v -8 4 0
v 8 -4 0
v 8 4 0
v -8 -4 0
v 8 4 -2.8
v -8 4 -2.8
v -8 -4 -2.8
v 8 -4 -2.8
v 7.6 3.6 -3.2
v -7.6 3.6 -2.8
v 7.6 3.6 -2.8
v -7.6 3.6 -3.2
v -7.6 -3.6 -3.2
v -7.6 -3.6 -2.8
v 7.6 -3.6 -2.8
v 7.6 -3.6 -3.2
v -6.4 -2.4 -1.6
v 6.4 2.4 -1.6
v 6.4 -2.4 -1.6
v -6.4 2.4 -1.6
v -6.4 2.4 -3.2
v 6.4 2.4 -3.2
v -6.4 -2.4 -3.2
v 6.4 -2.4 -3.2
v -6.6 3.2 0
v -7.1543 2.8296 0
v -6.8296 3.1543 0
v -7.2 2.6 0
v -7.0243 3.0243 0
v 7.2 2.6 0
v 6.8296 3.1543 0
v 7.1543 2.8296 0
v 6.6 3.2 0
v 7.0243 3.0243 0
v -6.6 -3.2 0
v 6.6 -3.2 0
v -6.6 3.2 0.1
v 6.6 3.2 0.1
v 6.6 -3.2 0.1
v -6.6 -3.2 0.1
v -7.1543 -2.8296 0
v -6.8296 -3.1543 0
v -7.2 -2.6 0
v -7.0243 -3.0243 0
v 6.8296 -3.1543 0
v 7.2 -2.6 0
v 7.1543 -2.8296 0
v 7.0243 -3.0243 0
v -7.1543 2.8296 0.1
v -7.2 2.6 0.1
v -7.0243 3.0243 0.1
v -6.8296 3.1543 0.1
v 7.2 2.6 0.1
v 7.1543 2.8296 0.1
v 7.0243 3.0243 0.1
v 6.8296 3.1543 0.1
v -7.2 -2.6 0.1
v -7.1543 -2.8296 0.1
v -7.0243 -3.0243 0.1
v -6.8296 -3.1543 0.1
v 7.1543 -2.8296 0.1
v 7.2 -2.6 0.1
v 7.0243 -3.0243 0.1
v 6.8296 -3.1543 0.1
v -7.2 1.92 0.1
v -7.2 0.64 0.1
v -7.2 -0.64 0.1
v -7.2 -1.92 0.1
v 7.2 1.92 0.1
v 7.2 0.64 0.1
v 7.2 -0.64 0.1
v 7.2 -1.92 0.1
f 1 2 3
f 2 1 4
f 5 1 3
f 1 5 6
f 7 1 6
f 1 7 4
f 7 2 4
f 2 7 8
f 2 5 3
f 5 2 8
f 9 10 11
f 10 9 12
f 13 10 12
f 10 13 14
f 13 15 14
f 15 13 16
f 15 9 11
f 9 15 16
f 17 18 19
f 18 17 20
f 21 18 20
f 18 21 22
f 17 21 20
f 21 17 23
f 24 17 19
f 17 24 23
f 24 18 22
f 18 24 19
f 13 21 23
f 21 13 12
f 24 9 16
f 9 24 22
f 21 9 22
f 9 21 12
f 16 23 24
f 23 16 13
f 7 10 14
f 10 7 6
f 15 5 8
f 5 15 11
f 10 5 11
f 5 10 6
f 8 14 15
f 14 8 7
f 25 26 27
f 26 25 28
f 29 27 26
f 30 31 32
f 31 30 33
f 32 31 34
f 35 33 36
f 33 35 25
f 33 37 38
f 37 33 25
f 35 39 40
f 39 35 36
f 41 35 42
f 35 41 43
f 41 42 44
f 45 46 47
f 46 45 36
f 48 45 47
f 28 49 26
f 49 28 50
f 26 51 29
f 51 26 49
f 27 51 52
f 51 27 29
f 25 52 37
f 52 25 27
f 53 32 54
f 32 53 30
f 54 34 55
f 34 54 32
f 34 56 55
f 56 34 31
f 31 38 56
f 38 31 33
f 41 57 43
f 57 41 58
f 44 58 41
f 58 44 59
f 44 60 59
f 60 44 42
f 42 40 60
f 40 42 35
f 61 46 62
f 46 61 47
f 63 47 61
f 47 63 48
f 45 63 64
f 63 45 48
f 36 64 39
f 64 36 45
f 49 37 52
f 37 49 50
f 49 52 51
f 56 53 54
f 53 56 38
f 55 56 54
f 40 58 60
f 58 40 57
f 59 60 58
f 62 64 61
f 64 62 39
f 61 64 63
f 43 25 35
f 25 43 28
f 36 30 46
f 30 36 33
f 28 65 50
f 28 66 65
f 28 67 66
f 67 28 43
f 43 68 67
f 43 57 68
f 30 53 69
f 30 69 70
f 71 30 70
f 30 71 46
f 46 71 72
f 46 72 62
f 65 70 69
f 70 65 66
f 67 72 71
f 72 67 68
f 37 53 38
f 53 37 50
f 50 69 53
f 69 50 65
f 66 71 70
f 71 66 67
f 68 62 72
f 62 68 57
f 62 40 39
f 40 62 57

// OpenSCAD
// file: ../p/box5.scad
use <../lib.scad>
function ldraw_lib__box5() = [
// 0 Box with 5 Faces and All Edges
// 0 Name: box5.dat
// 0 Author: James Jessiman
// 0 !LDRAW_ORG Primitive UPDATE 2012-01
// 0 !LICENSE Licensed under CC BY 4.0 : see CAreadme.txt
// 
// 0 BFC CERTIFY CCW
  [0,"BFC","CERTIFY"],
  [0,"BFC","CCW"],
// 
// 0 !HISTORY 2002-04-03 [sbliss] Modified for BFC compliance
// 0 !HISTORY 2002-04-25 [PTadmin] Official Update 2002-02
// 0 !HISTORY 2007-06-24 [PTadmin] Header formatted for Contributor Agreement
// 0 !HISTORY 2008-07-01 [PTadmin] Official Update 2008-01
// 0 !HISTORY 2012-02-16 [Philo] Changed to CCW
// 0 !HISTORY 2012-03-30 [PTadmin] Official Update 2012-01
// 
// 
// 2 24 1 1 1 -1 1 1
  [2,24,1,1,1,-1,1,1],
// 2 24 -1 1 1 -1 1 -1
  [2,24,-1,1,1,-1,1,-1],
// 2 24 -1 1 -1 1 1 -1
  [2,24,-1,1,-1,1,1,-1],
// 2 24 1 1 -1 1 1 1
  [2,24,1,1,-1,1,1,1],
// 2 24 1 0 1 -1 0 1
  [2,24,1,0,1,-1,0,1],
// 2 24 -1 0 1 -1 0 -1
  [2,24,-1,0,1,-1,0,-1],
// 2 24 -1 0 -1 1 0 -1
  [2,24,-1,0,-1,1,0,-1],
// 2 24 1 0 -1 1 0 1
  [2,24,1,0,-1,1,0,1],
// 2 24 1 0 1 1 1 1
  [2,24,1,0,1,1,1,1],
// 2 24 -1 0 1 -1 1 1
  [2,24,-1,0,1,-1,1,1],
// 2 24 1 0 -1 1 1 -1
  [2,24,1,0,-1,1,1,-1],
// 2 24 -1 0 -1 -1 1 -1
  [2,24,-1,0,-1,-1,1,-1],
// 4 16 -1 1 1 1 1 1 1 1 -1 -1 1 -1
  [4,16,-1,1,1,1,1,1,1,1,-1,-1,1,-1],
// 4 16 -1 1 1 -1 0 1 1 0 1 1 1 1
  [4,16,-1,1,1,-1,0,1,1,0,1,1,1,1],
// 4 16 -1 1 -1 -1 0 -1 -1 0 1 -1 1 1
  [4,16,-1,1,-1,-1,0,-1,-1,0,1,-1,1,1],
// 4 16 1 1 -1 1 0 -1 -1 0 -1 -1 1 -1
  [4,16,1,1,-1,1,0,-1,-1,0,-1,-1,1,-1],
// 4 16 1 1 1 1 0 1 1 0 -1 1 1 -1
  [4,16,1,1,1,1,0,1,1,0,-1,1,1,-1],
];
module ldraw_lib__box5(step=0, col=false, unit=2/5, alt=false, line=0.2, solid=!$preview)
    makepoly(ldraw_lib__box5(), step=step, col=col, unit=unit, alt=alt, line=line, solid=solid);
ldraw_lib__box5(line=0.2);
// file: ../p/box4.scad
use <../lib.scad>
function ldraw_lib__box4() = [
// 0 Box with 4 Faces (2 Parallel Pairs) and All Edges
// 0 Name: box4.dat
// 0 Author: James Jessiman
// 0 !LDRAW_ORG Primitive UPDATE 2012-01
// 0 !LICENSE Licensed under CC BY 4.0 : see CAreadme.txt
// 
// 0 BFC CERTIFY CCW
  [0,"BFC","CERTIFY"],
  [0,"BFC","CCW"],
// 
// 0 !HISTORY 2002-04-03 [sbliss] Modified for BFC compliance
// 0 !HISTORY 2002-04-25 [PTadmin] Official Update 2002-02
// 0 !HISTORY 2007-06-24 [PTadmin] Header formatted for Contributor Agreement
// 0 !HISTORY 2008-07-01 [PTadmin] Official Update 2008-01
// 0 !HISTORY 2012-02-16 [Philo] Changed to CCW
// 0 !HISTORY 2012-03-30 [PTadmin] Official Update 2012-01
// 
// 
// 2 24 1 1 1 -1 1 1
  [2,24,1,1,1,-1,1,1],
// 2 24 -1 1 1 -1 1 -1
  [2,24,-1,1,1,-1,1,-1],
// 2 24 -1 1 -1 1 1 -1
  [2,24,-1,1,-1,1,1,-1],
// 2 24 1 1 -1 1 1 1
  [2,24,1,1,-1,1,1,1],
// 2 24 1 0 1 -1 0 1
  [2,24,1,0,1,-1,0,1],
// 2 24 -1 0 1 -1 0 -1
  [2,24,-1,0,1,-1,0,-1],
// 2 24 -1 0 -1 1 0 -1
  [2,24,-1,0,-1,1,0,-1],
// 2 24 1 0 -1 1 0 1
  [2,24,1,0,-1,1,0,1],
// 2 24 1 0 1 1 1 1
  [2,24,1,0,1,1,1,1],
// 2 24 -1 0 1 -1 1 1
  [2,24,-1,0,1,-1,1,1],
// 2 24 1 0 -1 1 1 -1
  [2,24,1,0,-1,1,1,-1],
// 2 24 -1 0 -1 -1 1 -1
  [2,24,-1,0,-1,-1,1,-1],
// 4 16 -1 1 1 -1 0 1 1 0 1 1 1 1
  [4,16,-1,1,1,-1,0,1,1,0,1,1,1,1],
// 4 16 -1 1 -1 -1 0 -1 -1 0 1 -1 1 1
  [4,16,-1,1,-1,-1,0,-1,-1,0,1,-1,1,1],
// 4 16 1 1 -1 1 0 -1 -1 0 -1 -1 1 -1
  [4,16,1,1,-1,1,0,-1,-1,0,-1,-1,1,-1],
// 4 16 1 1 1 1 0 1 1 0 -1 1 1 -1
  [4,16,1,1,1,1,0,1,1,0,-1,1,1,-1],
];
module ldraw_lib__box4(step=0, col=false, unit=2/5, alt=false, line=0.2, solid=!$preview)
    makepoly(ldraw_lib__box4(), step=step, col=col, unit=unit, alt=alt, line=line, solid=solid);
ldraw_lib__box4(line=0.2);
// file: ../p/box3u12.scad
use <../lib.scad>
function ldraw_lib__box3u12() = [
// 0 Box with 3 Parallel Faces without Any Edges
// 0 Name: box3u12.dat
// 0 Author: J.C. Tchang [tchang]
// 0 !LDRAW_ORG Primitive UPDATE 2014-02
// 0 !LICENSE Licensed under CC BY 4.0 : see CAreadme.txt
// 
// 0 BFC CERTIFY CCW
  [0,"BFC","CERTIFY"],
  [0,"BFC","CCW"],
// 
// 0 !HISTORY 2014-12-23 [PTadmin] Official Update 2014-02
// 
// 
// 4 16 -1 1 1 1 1 1 1 1 -1 -1 1 -1
  [4,16,-1,1,1,1,1,1,1,1,-1,-1,1,-1],
// 4 16 -1 1 1 -1 0 1 1 0 1 1 1 1
  [4,16,-1,1,1,-1,0,1,1,0,1,1,1,1],
// 4 16 1 1 -1 1 0 -1 -1 0 -1 -1 1 -1
  [4,16,1,1,-1,1,0,-1,-1,0,-1,-1,1,-1],
];
module ldraw_lib__box3u12(step=0, col=false, unit=2/5, alt=false, line=0.2, solid=!$preview)
    makepoly(ldraw_lib__box3u12(), step=step, col=col, unit=unit, alt=alt, line=line, solid=solid);
ldraw_lib__box3u12(line=0.2);
// file: ../p/1-4cyli.scad
use <../lib.scad>
function ldraw_lib__1_4cyli() = [
// 0 Cylinder 0.25
// 0 Name: 1-4cyli.dat
// 0 Author: James Jessiman
// 0 !LDRAW_ORG Primitive UPDATE 2012-01
// 0 !LICENSE Licensed under CC BY 4.0 : see CAreadme.txt
// 
// 0 BFC CERTIFY CCW
  [0,"BFC","CERTIFY"],
  [0,"BFC","CCW"],
// 
// 0 !HISTORY 2002-03-23 [sbliss] Added BFC statement.
// 0 !HISTORY 2002-04-25 [PTadmin] Official Update 2002-02
// 0 !HISTORY 2007-06-22 [PTadmin] Header formatted for Contributor Agreement
// 0 !HISTORY 2008-07-01 [PTadmin] Official Update 2008-01
// 0 !HISTORY 2012-02-16 [Philo] Changed to CCW
// 0 !HISTORY 2012-03-30 [PTadmin] Official Update 2012-01
// 
// 
// 4 16 1 1 0 0.9239 1 0.3827 0.9239 0 0.3827 1 0 0
  [4,16,1,1,0,0.9239,1,0.3827,0.9239,0,0.3827,1,0,0],
// 5 24 1 0 0 1 1 0 0.9239 0 0.3827 1 0 -1
  [5,24,1,0,0,1,1,0,0.9239,0,0.3827,1,0,-1],
// 4 16 0.9239 1 0.3827 0.7071 1 0.7071 0.7071 0 0.7071 0.9239 0 0.3827
  [4,16,0.9239,1,0.3827,0.7071,1,0.7071,0.7071,0,0.7071,0.9239,0,0.3827],
// 5 24 0.9239 0 0.3827 0.9239 1 0.3827 0.7071 0 0.7071 1 0 0
  [5,24,0.9239,0,0.3827,0.9239,1,0.3827,0.7071,0,0.7071,1,0,0],
// 4 16 0.7071 1 0.7071 0.3827 1 0.9239 0.3827 0 0.9239 0.7071 0 0.7071
  [4,16,0.7071,1,0.7071,0.3827,1,0.9239,0.3827,0,0.9239,0.7071,0,0.7071],
// 5 24 0.7071 0 0.7071 0.7071 1 0.7071 0.3827 0 0.9239 0.9239 0 0.3827
  [5,24,0.7071,0,0.7071,0.7071,1,0.7071,0.3827,0,0.9239,0.9239,0,0.3827],
// 4 16 0.3827 1 0.9239 0 1 1 0 0 1 0.3827 0 0.9239
  [4,16,0.3827,1,0.9239,0,1,1,0,0,1,0.3827,0,0.9239],
// 5 24 0.3827 0 0.9239 0.3827 1 0.9239 0 0 1 0.7071 0 0.7071
  [5,24,0.3827,0,0.9239,0.3827,1,0.9239,0,0,1,0.7071,0,0.7071],
// 5 24 0 0 1 0 1 1 0.3827 0 0.9239 -1 0 1
  [5,24,0,0,1,0,1,1,0.3827,0,0.9239,-1,0,1],
];
module ldraw_lib__1_4cyli(step=0, col=false, unit=2/5, alt=false, line=0.2, solid=!$preview)
    makepoly(ldraw_lib__1_4cyli(), step=step, col=col, unit=unit, alt=alt, line=line, solid=solid);
ldraw_lib__1_4cyli(line=0.2);
// file: ../p/1-4chrd.scad
use <../lib.scad>
function ldraw_lib__1_4chrd() = [
// 0 Chord 0.25
// 0 Name: 1-4chrd.dat
// 0 Author: Max Martin Richter [MMR1988]
// 0 !LDRAW_ORG Primitive UPDATE 2023-05
// 0 !LICENSE Licensed under CC BY 4.0 : see CAreadme.txt
// 
// 0 BFC CERTIFY CCW
  [0,"BFC","CERTIFY"],
  [0,"BFC","CCW"],
// 
// 0 !HISTORY 2004-04-22 [PTadmin] Official Update 2004-02
// 0 !HISTORY 2007-10-09 [PTadmin] Header formatted for Contributor Agreement
// 0 !HISTORY 2008-07-01 [PTadmin] Official Update 2008-01
// 0 !HISTORY 2012-08-02 [MMR1988] Re-creation with PrimGen2 and Rectifier
// 0 !HISTORY 2012-08-09 [PTadmin] Official Update 2012-02
// 0 !HISTORY 2023-10-27 [OrionP] Change author to MMR1988 from hafhead
// 0 !HISTORY 2023-10-31 [OrionP] Official Update 2023-05
// 
// 4 16 0.9239 0 0.3827 0.3827 0 0.9239 0 0 1 1 0 0
  [4,16,0.9239,0,0.3827,0.3827,0,0.9239,0,0,1,1,0,0],
// 3 16 0.7071 0 0.7071 0.3827 0 0.9239 0.9239 0 0.3827
  [3,16,0.7071,0,0.7071,0.3827,0,0.9239,0.9239,0,0.3827],
];
module ldraw_lib__1_4chrd(step=0, col=false, unit=2/5, alt=false, line=0.2, solid=!$preview)
    makepoly(ldraw_lib__1_4chrd(), step=step, col=col, unit=unit, alt=alt, line=line, solid=solid);
ldraw_lib__1_4chrd(line=0.2);
// file: s/3069bs01.scad
use <../../lib.scad>
use <../../p/box4.scad>
use <../../p/box5.scad>
function ldraw_lib__s__3069bs01() = [
// 0 ~Tile  1 x  2 with Groove without Top Face
// 0 Name: s\3069bs01.dat
// 0 Author: Santeri Piippo [arezey]
// 0 !LDRAW_ORG Subpart UPDATE 2010-02
// 0 !LICENSE Licensed under CC BY 4.0 : see CAreadme.txt
// 
// 0 BFC CERTIFY CCW
  [0,"BFC","CERTIFY"],
  [0,"BFC","CCW"],
// 
// 0 !HISTORY 2010-07-05 [PTadmin] Official Update 2010-02
// 
// 
// 1 16 0 0 0 20 0 0 0 7 0 0 0 10 box4.dat
  [1,16,0,0,0,20,0,0,0,7,0,0,0,10, ldraw_lib__box4()],
// 1 16 0 7 0 19 0 0 0 1 0 0 0 9 box4.dat
  [1,16,0,7,0,19,0,0,0,1,0,0,0,9, ldraw_lib__box4()],
// 0 BFC INVERTNEXT
  [0,"BFC","INVERTNEXT"],
// 1 16 0 8 0 16 0 0 0 -4 0 0 0 6 box5.dat
  [1,16,0,8,0,16,0,0,0,-4,0,0,0,6, ldraw_lib__box5()],
// 4 16 -19 8 9 -16 8 6 -16 8 -6 -19 8 -9
  [4,16,-19,8,9,-16,8,6,-16,8,-6,-19,8,-9],
// 4 16 19 8 -9 16 8 -6 16 8 6 19 8 9
  [4,16,19,8,-9,16,8,-6,16,8,6,19,8,9],
// 4 16 19 8 9 16 8 6 -16 8 6 -19 8 9
  [4,16,19,8,9,16,8,6,-16,8,6,-19,8,9],
// 4 16 -19 8 -9 -16 8 -6 16 8 -6 19 8 -9
  [4,16,-19,8,-9,-16,8,-6,16,8,-6,19,8,-9],
// 4 16 -20 7 10 -19 7 9 -19 7 -9 -20 7 -10
  [4,16,-20,7,10,-19,7,9,-19,7,-9,-20,7,-10],
// 4 16 20 7 -10 19 7 -9 19 7 9 20 7 10
  [4,16,20,7,-10,19,7,-9,19,7,9,20,7,10],
// 4 16 20 7 10 19 7 9 -19 7 9 -20 7 10
  [4,16,20,7,10,19,7,9,-19,7,9,-20,7,10],
// 4 16 -20 7 -10 -19 7 -9 19 7 -9 20 7 -10
  [4,16,-20,7,-10,-19,7,-9,19,7,-9,20,7,-10],
// 0 //
];
module ldraw_lib__s__3069bs01(step=0, col=false, unit=2/5, alt=false, line=0.2, solid=!$preview)
    makepoly(ldraw_lib__s__3069bs01(), step=step, col=col, unit=unit, alt=alt, line=line, solid=solid);
ldraw_lib__s__3069bs01(line=0.2);
// file: 6148328af.scad
use <../lib.scad>
use <../p/1-4chrd.scad>
use <../p/1-4cyli.scad>
use <../p/box3u12.scad>
function ldraw_lib__6148328af() = [
// 0 Sticker  0.8 x  1.8 with White Stripes on Red Background
// 0 Name: 6148328af.dat
// 0 Author: Massimo Maso [Sirio]
// 0 !LDRAW_ORG Part UPDATE 2024-08
// 0 !LICENSE Licensed under CC BY 4.0 : see CAreadme.txt
// 
// 0 BFC CERTIFY CCW
  [0,"BFC","CERTIFY"],
  [0,"BFC","CCW"],
// 
// 0 !KEYWORDS 917K, Bricklink 75876stk01, Brickowl 852010, Pit Lane, Porsche
// 0 !KEYWORDS Rebrickable 26357, set 75876, Speed Champions
// 
// 0 !HISTORY 2024-09-30 [OrionP] Official Update 2024-08
// 
// 
// 0 // Primitives
// 
// 1 16 -16.5 0 6.5 -1.5 0 0 0 -1 0 0 0 1.5 1-4chrd.dat
  [1,16,-16.5,0,6.5,-1.5,0,0,0,-1,0,0,0,1.5, ldraw_lib__1_4chrd()],
// 1 16 16.5 0 6.5 1.5 0 0 0 -1 0 0 0 1.5 1-4chrd.dat
  [1,16,16.5,0,6.5,1.5,0,0,0,-1,0,0,0,1.5, ldraw_lib__1_4chrd()],
// 1 16 0 -.25 0 16.5 0 0 0 .25 0 0 0 8 box3u12.dat
  [1,16,0,-.25,0,16.5,0,0,0,.25,0,0,0,8, ldraw_lib__box3u12()],
// 1 16 -16.5 0 -6.5 -1.5 0 0 0 -1 0 0 0 -1.5 1-4chrd.dat
  [1,16,-16.5,0,-6.5,-1.5,0,0,0,-1,0,0,0,-1.5, ldraw_lib__1_4chrd()],
// 1 16 16.5 0 -6.5 1.5 0 0 0 -1 0 0 0 -1.5 1-4chrd.dat
  [1,16,16.5,0,-6.5,1.5,0,0,0,-1,0,0,0,-1.5, ldraw_lib__1_4chrd()],
// 1 16 -16.5 0 6.5 -1.5 0 0 0 -.25 0 0 0 1.5 1-4cyli.dat
  [1,16,-16.5,0,6.5,-1.5,0,0,0,-.25,0,0,0,1.5, ldraw_lib__1_4cyli()],
// 1 16 16.5 0 6.5 1.5 0 0 0 -.25 0 0 0 1.5 1-4cyli.dat
  [1,16,16.5,0,6.5,1.5,0,0,0,-.25,0,0,0,1.5, ldraw_lib__1_4cyli()],
// 1 16 -16.5 0 -6.5 -1.5 0 0 0 -.25 0 0 0 -1.5 1-4cyli.dat
  [1,16,-16.5,0,-6.5,-1.5,0,0,0,-.25,0,0,0,-1.5, ldraw_lib__1_4cyli()],
// 1 16 16.5 0 -6.5 1.5 0 0 0 -.25 0 0 0 -1.5 1-4cyli.dat
  [1,16,16.5,0,-6.5,1.5,0,0,0,-.25,0,0,0,-1.5, ldraw_lib__1_4cyli()],
// 1 15 -16.5 -.25 6.5 -1.5 0 0 0 1 0 0 0 1.5 1-4chrd.dat
  [1,15,-16.5,-.25,6.5,-1.5,0,0,0,1,0,0,0,1.5, ldraw_lib__1_4chrd()],
// 1 15 16.5 -.25 6.5 1.5 0 0 0 1 0 0 0 1.5 1-4chrd.dat
  [1,15,16.5,-.25,6.5,1.5,0,0,0,1,0,0,0,1.5, ldraw_lib__1_4chrd()],
// 1 15 -16.5 -.25 -6.5 -1.5 0 0 0 1 0 0 0 -1.5 1-4chrd.dat
  [1,15,-16.5,-.25,-6.5,-1.5,0,0,0,1,0,0,0,-1.5, ldraw_lib__1_4chrd()],
// 1 15 16.5 -.25 -6.5 1.5 0 0 0 1 0 0 0 -1.5 1-4chrd.dat
  [1,15,16.5,-.25,-6.5,1.5,0,0,0,1,0,0,0,-1.5, ldraw_lib__1_4chrd()],
// 0 // Bottom faces
// 4 16 -16.5 0 8 -16.5 0 -8 -18 0 -6.5 -18 0 6.5
  [4,16,-16.5,0,8,-16.5,0,-8,-18,0,-6.5,-18,0,6.5],
// 4 16 16.5 0 8 18 0 6.5 18 0 -6.5 16.5 0 -8
  [4,16,16.5,0,8,18,0,6.5,18,0,-6.5,16.5,0,-8],
// 0 // Lateral faces
// 3 16 -18 0 6.5 -18 -.25 4.8 -18 -.25 6.5
  [3,16,-18,0,6.5,-18,-.25,4.8,-18,-.25,6.5],
// 3 16 -18 0 6.5 -18 -.25 1.6 -18 -.25 4.8
  [3,16,-18,0,6.5,-18,-.25,1.6,-18,-.25,4.8],
// 4 16 -18 0 6.5 -18 0 -6.5 -18 -.25 -1.6 -18 -.25 1.6
  [4,16,-18,0,6.5,-18,0,-6.5,-18,-.25,-1.6,-18,-.25,1.6],
// 3 16 -18 0 -6.5 -18 -.25 -4.8 -18 -.25 -1.6
  [3,16,-18,0,-6.5,-18,-.25,-4.8,-18,-.25,-1.6],
// 3 16 -18 0 -6.5 -18 -.25 -6.5 -18 -.25 -4.8
  [3,16,-18,0,-6.5,-18,-.25,-6.5,-18,-.25,-4.8],
// 3 16 18 0 6.5 18 -.25 6.5 18 -.25 4.8
  [3,16,18,0,6.5,18,-.25,6.5,18,-.25,4.8],
// 3 16 18 0 6.5 18 -.25 4.8 18 -.25 1.6
  [3,16,18,0,6.5,18,-.25,4.8,18,-.25,1.6],
// 4 16 18 0 6.5 18 -.25 1.6 18 -.25 -1.6 18 0 -6.5
  [4,16,18,0,6.5,18,-.25,1.6,18,-.25,-1.6,18,0,-6.5],
// 3 16 18 0 -6.5 18 -.25 -1.6 18 -.25 -4.8
  [3,16,18,0,-6.5,18,-.25,-1.6,18,-.25,-4.8],
// 3 16 18 0 -6.5 18 -.25 -4.8 18 -.25 -6.5
  [3,16,18,0,-6.5,18,-.25,-4.8,18,-.25,-6.5],
// 0 // Top faces
// 0 // Red faces
// 4 4 -18 -.25 4.8 -18 -.25 1.6 18 -.25 1.6 18 -.25 4.8
  [4,4,-18,-.25,4.8,-18,-.25,1.6,18,-.25,1.6,18,-.25,4.8],
// 4 4 -18 -.25 -1.6 -18 -.25 -4.8 18 -.25 -4.8 18 -.25 -1.6
  [4,4,-18,-.25,-1.6,-18,-.25,-4.8,18,-.25,-4.8,18,-.25,-1.6],
// 0 // White faces
// 4 15 -18 -.25 6.5 18 -.25 6.5 16.5 -.25 8 -16.5 -.25 8
  [4,15,-18,-.25,6.5,18,-.25,6.5,16.5,-.25,8,-16.5,-.25,8],
// 4 15 -18 -.25 6.5 -18 -.25 4.8 18 -.25 4.8 18 -.25 6.5
  [4,15,-18,-.25,6.5,-18,-.25,4.8,18,-.25,4.8,18,-.25,6.5],
// 4 15 -18 -.25 1.6 -18 -.25 -1.6 18 -.25 -1.6 18 -.25 1.6
  [4,15,-18,-.25,1.6,-18,-.25,-1.6,18,-.25,-1.6,18,-.25,1.6],
// 4 15 -18 -.25 -4.8 -18 -.25 -6.5 18 -.25 -6.5 18 -.25 -4.8
  [4,15,-18,-.25,-4.8,-18,-.25,-6.5,18,-.25,-6.5,18,-.25,-4.8],
// 4 15 -18 -.25 -6.5 -16.5 -.25 -8 16.5 -.25 -8 18 -.25 -6.5
  [4,15,-18,-.25,-6.5,-16.5,-.25,-8,16.5,-.25,-8,18,-.25,-6.5],
];
module ldraw_lib__6148328af(step=0, col=false, unit=2/5, alt=false, line=0.2, solid=!$preview)
    makepoly(ldraw_lib__6148328af(), step=step, col=col, unit=unit, alt=alt, line=line, solid=solid);
ldraw_lib__6148328af(line=0.2);
// file: 3069b.scad
use <../lib.scad>
use <s/3069bs01.scad>
function ldraw_lib__3069b() = [
// 0 Tile  1 x  2 with Groove
// 0 Name: 3069b.dat
// 0 Author: Santeri Piippo [arezey]
// 0 !LDRAW_ORG Part UPDATE 2010-02
// 0 !LICENSE Licensed under CC BY 4.0 : see CAreadme.txt
// 
// 0 BFC CERTIFY CCW
  [0,"BFC","CERTIFY"],
  [0,"BFC","CCW"],
// 
// 0 !KEYWORDS BrickLink 3069
// 
// 0 !HISTORY 2010-07-05 [PTadmin] Official Update 2010-02
// 
// 
// 4 16 20 0 -10 20 0 10 -20 0 10 -20 0 -10
  [4,16,20,0,-10,20,0,10,-20,0,10,-20,0,-10],
// 1 16 0 0 0 1 0 0 0 1 0 0 0 1 s\3069bs01.dat
  [1,16,0,0,0,1,0,0,0,1,0,0,0,1, ldraw_lib__s__3069bs01()],
// 0 //
];
module ldraw_lib__3069b(step=0, col=false, unit=2/5, alt=false, line=0.2, solid=!$preview)
    makepoly(ldraw_lib__3069b(), step=step, col=col, unit=unit, alt=alt, line=line, solid=solid);
ldraw_lib__3069b(line=0.2);
// main file
use <../lib.scad>
use <3069b.scad>
use <6148328af.scad>
function ldraw_lib__3069bd28() = [
// 0 Tile  1 x  2 with White Stripes on Red Background Sticker
// 0 Name: 3069bd28.dat
// 0 Author: Vincent Messenet [Cheenzo]
// 0 !LDRAW_ORG Shortcut UPDATE 2026-05
// 0 !LICENSE Licensed under CC BY 4.0 : see CAreadme.txt
// 
// 0 BFC CERTIFY CCW
  [0,"BFC","CERTIFY"],
  [0,"BFC","CCW"],
// 
// 0 !CATEGORY Sticker Shortcut
// 
// 0 !KEYWORDS Bricklink 3069pb0685, Porsche 919 Hybrid and 917K Pit Lane
// 0 !KEYWORDS set 75876, Speed Champions
// 
// 0 !HISTORY 2026-05-31 [OrionP] Official Update 2026-05
// 
// 1 16 0 0 0 1 0 0 0 1 0 0 0 1 3069b.dat
  [1,16,0,0,0,1,0,0,0,1,0,0,0,1, ldraw_lib__3069b()],
// 1 16 0 0 0 1 0 0 0 1 0 0 0 1 6148328af.dat
  [1,16,0,0,0,1,0,0,0,1,0,0,0,1, ldraw_lib__6148328af()],
];
module ldraw_lib__3069bd28(step=0, col=false, unit=2/5, alt=false, line=0.2, solid=!$preview)
    makepoly(ldraw_lib__3069bd28(), step=step, col=col, unit=unit, alt=alt, line=line, solid=solid);
ldraw_lib__3069bd28(line=0.2);
